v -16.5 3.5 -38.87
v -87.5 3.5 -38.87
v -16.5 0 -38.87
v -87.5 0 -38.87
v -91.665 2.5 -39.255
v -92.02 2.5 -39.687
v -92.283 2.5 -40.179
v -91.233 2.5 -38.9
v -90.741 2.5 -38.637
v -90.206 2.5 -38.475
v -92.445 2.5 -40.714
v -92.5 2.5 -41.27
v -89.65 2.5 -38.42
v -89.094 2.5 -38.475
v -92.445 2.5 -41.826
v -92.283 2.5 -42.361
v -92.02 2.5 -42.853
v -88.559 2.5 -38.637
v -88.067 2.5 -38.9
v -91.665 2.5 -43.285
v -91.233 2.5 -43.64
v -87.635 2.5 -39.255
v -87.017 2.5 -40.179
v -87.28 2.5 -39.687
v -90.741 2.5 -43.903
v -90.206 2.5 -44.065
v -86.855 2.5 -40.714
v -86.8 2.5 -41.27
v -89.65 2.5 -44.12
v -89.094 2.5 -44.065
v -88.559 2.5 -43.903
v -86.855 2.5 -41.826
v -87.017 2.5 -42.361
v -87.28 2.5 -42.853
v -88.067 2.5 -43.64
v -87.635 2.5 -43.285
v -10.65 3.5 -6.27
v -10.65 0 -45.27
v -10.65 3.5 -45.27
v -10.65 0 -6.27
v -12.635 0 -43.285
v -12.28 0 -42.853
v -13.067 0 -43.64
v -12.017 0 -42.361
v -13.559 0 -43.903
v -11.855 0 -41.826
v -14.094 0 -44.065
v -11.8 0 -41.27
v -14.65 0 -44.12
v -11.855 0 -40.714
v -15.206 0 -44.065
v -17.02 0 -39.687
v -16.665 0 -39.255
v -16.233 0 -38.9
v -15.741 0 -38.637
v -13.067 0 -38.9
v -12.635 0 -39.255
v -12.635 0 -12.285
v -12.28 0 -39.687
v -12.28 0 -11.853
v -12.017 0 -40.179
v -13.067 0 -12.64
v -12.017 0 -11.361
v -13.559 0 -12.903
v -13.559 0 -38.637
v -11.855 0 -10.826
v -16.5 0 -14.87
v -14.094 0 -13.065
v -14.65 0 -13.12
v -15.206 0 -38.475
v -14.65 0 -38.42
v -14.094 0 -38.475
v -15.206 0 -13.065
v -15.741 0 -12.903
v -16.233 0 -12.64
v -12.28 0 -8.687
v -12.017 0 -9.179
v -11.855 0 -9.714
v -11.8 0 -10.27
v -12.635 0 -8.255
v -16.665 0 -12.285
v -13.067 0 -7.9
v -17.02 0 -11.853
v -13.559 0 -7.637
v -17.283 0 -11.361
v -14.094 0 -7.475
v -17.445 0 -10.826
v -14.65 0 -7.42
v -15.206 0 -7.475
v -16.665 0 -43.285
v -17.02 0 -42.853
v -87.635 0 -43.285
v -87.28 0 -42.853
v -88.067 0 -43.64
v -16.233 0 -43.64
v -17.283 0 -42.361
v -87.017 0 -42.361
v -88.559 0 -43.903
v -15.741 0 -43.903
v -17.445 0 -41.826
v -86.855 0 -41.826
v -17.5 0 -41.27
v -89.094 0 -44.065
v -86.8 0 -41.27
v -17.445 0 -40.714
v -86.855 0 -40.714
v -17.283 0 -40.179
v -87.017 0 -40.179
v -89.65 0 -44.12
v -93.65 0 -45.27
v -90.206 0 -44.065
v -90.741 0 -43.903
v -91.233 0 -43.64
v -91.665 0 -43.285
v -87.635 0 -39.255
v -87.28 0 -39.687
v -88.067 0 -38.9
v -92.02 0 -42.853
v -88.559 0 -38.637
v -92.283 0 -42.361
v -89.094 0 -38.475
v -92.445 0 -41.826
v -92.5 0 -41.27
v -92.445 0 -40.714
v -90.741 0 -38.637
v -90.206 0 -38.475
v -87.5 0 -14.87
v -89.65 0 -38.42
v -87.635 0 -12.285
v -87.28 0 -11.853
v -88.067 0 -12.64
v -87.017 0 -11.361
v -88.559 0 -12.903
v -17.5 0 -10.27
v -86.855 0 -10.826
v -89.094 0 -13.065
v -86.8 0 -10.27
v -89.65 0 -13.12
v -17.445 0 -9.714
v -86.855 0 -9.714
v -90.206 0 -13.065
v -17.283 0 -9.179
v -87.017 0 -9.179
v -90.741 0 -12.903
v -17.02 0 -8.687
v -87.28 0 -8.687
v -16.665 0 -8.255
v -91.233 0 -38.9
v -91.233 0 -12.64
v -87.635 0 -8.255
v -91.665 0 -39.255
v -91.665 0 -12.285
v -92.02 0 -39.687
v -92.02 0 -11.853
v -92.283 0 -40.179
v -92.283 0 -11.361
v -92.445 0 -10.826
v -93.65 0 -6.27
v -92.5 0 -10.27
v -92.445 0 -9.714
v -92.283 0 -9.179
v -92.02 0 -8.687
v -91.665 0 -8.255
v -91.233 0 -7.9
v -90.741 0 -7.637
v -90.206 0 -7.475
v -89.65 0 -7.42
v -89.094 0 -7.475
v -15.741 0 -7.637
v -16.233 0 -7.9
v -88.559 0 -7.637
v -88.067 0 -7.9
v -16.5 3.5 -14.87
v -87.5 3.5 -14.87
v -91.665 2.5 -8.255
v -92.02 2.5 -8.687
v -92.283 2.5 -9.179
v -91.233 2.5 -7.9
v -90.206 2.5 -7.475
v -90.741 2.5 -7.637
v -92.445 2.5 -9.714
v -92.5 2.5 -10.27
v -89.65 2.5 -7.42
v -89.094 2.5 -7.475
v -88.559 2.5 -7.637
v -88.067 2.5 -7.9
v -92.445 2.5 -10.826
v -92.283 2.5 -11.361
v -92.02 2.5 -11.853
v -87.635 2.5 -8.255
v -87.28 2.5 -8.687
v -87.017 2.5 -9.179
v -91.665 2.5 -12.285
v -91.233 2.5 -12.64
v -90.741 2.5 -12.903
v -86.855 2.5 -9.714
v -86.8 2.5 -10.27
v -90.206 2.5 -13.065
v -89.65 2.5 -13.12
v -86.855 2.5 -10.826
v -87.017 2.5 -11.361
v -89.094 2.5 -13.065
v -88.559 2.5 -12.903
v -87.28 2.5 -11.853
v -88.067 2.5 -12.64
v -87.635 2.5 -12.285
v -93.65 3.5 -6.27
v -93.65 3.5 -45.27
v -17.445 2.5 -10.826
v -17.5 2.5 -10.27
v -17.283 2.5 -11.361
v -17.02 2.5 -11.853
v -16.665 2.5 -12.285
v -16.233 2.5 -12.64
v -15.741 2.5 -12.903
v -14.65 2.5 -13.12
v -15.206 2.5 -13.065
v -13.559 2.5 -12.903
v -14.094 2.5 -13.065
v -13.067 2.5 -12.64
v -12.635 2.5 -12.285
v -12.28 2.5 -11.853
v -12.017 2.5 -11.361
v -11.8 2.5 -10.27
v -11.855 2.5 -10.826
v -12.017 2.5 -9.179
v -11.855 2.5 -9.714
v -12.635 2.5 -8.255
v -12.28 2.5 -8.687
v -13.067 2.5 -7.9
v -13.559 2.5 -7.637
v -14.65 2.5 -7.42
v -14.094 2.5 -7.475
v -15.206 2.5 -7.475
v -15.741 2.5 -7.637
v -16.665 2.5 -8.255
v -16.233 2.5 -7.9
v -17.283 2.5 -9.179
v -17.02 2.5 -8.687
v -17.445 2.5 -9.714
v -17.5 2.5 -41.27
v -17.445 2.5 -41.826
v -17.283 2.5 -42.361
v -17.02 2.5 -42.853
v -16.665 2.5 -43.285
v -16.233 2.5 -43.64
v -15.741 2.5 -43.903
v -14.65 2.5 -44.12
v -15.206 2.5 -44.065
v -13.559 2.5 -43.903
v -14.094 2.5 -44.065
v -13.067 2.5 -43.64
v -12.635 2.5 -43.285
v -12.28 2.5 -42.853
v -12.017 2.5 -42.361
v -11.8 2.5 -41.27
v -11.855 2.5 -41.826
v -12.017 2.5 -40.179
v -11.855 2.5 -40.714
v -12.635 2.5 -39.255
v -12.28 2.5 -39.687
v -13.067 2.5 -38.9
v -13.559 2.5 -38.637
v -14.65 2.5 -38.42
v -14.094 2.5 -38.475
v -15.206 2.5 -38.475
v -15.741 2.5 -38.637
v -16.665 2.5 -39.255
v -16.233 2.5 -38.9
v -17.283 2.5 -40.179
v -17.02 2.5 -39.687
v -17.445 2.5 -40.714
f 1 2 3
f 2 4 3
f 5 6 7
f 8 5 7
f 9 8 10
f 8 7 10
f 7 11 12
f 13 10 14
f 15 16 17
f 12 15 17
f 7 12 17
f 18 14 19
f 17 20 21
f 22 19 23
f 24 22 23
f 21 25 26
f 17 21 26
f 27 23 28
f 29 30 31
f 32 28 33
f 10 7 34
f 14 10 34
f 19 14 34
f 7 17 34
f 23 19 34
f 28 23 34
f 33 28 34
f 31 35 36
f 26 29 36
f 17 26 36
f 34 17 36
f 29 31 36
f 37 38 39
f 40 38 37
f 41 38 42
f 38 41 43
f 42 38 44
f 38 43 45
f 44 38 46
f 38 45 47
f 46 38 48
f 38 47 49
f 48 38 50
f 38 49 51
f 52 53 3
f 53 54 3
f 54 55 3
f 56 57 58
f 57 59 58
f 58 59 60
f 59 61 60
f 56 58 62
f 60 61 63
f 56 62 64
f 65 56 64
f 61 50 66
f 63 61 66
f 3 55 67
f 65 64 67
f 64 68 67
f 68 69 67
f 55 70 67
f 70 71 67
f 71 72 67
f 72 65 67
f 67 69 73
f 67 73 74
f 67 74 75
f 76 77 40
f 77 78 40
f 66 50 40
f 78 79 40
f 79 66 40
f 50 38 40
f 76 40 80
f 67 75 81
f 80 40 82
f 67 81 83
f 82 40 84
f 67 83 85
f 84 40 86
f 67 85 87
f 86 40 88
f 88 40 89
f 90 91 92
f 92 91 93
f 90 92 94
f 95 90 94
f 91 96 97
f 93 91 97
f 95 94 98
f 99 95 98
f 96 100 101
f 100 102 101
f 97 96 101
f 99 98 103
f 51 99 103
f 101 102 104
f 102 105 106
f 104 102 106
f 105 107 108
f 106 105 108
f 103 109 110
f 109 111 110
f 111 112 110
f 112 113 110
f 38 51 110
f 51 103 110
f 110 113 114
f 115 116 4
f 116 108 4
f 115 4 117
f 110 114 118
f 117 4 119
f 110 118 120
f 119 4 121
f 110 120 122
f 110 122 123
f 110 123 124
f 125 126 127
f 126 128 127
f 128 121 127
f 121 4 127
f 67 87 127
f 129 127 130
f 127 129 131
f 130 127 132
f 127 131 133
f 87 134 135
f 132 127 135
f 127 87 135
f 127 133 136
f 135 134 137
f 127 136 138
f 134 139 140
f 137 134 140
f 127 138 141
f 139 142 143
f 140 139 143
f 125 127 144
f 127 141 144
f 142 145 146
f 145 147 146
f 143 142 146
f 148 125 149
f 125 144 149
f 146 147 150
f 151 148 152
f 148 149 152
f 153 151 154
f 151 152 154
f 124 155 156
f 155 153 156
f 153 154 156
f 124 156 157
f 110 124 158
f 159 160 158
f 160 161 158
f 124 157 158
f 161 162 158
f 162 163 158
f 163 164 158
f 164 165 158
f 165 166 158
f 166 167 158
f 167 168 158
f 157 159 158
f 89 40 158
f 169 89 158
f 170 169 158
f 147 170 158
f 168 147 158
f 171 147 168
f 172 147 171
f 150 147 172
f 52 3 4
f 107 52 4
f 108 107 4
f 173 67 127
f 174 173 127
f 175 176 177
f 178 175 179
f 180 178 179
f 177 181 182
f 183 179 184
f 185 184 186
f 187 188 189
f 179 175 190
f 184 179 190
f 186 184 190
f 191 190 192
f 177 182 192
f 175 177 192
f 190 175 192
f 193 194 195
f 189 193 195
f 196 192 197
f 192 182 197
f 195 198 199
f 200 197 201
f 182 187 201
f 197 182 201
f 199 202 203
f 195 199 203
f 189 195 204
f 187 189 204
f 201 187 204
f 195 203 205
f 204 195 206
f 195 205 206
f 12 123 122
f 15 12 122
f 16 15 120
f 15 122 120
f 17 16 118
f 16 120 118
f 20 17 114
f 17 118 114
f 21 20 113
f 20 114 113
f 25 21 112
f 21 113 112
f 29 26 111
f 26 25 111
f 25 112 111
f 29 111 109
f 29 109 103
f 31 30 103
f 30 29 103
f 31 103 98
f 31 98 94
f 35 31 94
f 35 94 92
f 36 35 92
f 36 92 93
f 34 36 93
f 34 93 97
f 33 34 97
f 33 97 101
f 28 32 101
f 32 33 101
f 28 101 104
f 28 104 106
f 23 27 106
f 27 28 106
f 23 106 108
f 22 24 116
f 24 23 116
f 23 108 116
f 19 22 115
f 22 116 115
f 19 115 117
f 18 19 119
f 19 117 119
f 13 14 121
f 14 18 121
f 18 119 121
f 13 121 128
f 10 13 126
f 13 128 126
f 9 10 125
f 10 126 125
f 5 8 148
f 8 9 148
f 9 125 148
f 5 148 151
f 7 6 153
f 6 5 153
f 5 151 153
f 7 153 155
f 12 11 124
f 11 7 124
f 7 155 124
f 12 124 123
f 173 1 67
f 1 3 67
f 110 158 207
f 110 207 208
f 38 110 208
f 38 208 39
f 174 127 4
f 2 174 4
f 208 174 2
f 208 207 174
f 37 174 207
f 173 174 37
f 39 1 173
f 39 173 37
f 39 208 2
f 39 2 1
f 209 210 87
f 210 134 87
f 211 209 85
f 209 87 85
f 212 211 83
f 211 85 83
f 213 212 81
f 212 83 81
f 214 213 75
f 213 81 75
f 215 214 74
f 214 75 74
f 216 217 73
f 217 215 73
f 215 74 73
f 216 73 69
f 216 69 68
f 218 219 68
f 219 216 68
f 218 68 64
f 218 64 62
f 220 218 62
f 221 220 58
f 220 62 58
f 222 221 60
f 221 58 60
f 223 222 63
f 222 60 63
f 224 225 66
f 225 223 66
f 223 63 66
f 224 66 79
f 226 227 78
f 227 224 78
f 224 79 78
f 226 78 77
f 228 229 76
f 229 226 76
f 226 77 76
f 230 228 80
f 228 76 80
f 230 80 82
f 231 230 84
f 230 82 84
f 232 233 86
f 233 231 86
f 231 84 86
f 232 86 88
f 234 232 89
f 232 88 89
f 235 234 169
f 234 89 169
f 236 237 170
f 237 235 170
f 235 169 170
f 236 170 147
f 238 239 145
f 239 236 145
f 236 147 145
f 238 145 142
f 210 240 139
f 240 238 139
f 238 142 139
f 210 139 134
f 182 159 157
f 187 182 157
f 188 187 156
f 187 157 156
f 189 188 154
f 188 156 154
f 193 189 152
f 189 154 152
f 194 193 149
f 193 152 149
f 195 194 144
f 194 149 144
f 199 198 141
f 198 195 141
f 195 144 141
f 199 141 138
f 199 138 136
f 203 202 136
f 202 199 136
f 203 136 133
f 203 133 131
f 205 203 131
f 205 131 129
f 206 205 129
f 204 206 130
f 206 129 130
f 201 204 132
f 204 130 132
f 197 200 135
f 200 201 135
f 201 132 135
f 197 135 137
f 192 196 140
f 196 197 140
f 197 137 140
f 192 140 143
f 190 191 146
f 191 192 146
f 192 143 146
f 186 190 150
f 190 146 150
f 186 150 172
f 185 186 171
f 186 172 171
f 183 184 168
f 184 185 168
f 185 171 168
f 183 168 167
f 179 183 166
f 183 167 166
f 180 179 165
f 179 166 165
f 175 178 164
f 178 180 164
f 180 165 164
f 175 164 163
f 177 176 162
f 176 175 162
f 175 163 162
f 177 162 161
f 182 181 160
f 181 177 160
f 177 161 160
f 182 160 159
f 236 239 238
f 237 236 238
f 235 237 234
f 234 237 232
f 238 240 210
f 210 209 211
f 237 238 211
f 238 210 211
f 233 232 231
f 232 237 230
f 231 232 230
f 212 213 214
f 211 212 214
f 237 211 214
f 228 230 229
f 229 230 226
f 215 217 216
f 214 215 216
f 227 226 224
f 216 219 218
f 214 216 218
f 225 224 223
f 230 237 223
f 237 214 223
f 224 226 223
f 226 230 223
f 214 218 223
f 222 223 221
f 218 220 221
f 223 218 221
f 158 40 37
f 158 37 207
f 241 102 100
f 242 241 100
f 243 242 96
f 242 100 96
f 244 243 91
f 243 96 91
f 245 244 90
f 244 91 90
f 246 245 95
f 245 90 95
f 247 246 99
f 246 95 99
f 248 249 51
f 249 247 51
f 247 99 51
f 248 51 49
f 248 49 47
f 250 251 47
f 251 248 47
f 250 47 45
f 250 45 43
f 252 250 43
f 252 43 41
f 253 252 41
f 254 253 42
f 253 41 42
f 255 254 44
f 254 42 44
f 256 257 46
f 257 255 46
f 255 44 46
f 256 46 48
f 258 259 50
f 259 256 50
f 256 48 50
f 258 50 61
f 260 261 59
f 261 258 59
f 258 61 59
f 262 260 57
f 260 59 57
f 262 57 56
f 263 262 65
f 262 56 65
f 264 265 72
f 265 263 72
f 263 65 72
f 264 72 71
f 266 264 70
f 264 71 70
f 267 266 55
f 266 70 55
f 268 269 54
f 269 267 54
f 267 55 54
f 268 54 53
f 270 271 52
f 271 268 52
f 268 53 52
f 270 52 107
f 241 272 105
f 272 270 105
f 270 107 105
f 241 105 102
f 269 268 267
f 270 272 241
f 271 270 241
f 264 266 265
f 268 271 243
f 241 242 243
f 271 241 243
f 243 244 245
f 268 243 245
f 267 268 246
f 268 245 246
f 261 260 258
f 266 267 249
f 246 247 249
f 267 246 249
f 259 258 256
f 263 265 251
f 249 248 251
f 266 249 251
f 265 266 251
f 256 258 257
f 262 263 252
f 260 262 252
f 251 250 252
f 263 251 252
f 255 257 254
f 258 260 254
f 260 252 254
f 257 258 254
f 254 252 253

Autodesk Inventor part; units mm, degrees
ref_plane "YZ Plane" through (0, 0, 0) normal (1, 0, 0) x (0, 1, 0)
ref_plane "XZ Plane" through (0, 0, 0) normal (0, 1, 0) x (-1, 0, 0)
ref_plane "XY Plane" through (0, 0, 0) normal (0, 0, 1) x (1, 0, 0)
sketch "Esboço1" plane through (0, 0, 0) normal (0, 1, 0) x (-1, 0, 0)
  circle A0 centre (89.65, -41.2701) radius 1.5
  circle A1 centre (89.65, -10.2701) radius 1.5
  circle A2 centre (14.65, -10.2701) radius 1.5
  circle A3 centre (14.65, -41.2701) radius 1.5
  line L0 (14.65, -10.2701) -> (10.65, -10.2701) construction
  line L1 (10.65, -10.2701) -> (10.65, -6.2701) construction
  line L2 (10.65, -6.2701) -> (93.65, -6.2701)
  line L3 (93.65, -6.2701) -> (93.65, -45.2701)
  line L4 (93.65, -45.2701) -> (10.65, -45.2701)
  line L5 (10.65, -45.2701) -> (10.65, -6.2701)
  line L6 (87.5, -38.8701) -> (87.5, -14.8701) construction
  line L7 (87.5, -14.8701) -> (16.5, -14.8701) construction
  line L8 (16.5, -14.8701) -> (16.5, -38.8701) construction
  line L9 (16.5, -38.8701) -> (87.5, -38.8701) construction
  line L10 (87.5, -14.8701) -> (88.5, -14.8701) construction
  line L11 (88.5, -14.8701) -> (88.5, -13.8701) construction
  line L12 (88.5, -13.8701) -> (87.5, -13.8701) construction
  line L13 (87.5, -13.8701) -> (87.5, -14.8701) construction
  circle A4 centre (14.65, -10.2701) radius 2.85
  circle A5 centre (14.65, -41.2701) radius 2.85
  circle A6 centre (89.65, -41.2701) radius 2.85
  circle A7 centre (89.65, -10.2701) radius 2.85
  line L14 (16.5, -14.8701) -> (87.5, -14.8701)
  line L15 (87.5, -14.8701) -> (87.5, -38.8701)
  line L16 (87.5, -38.8701) -> (16.5, -38.8701)
  line L17 (16.5, -38.8701) -> (16.5, -14.8701)
  point P0 (0, 0)
  dimension "d0" = 4
  dimension "d1" = 4
  dimension "d2" = 4
  dimension "d3" = 4
  dimension "d4" = 4
  dimension "d5" = 4
  dimension "d6" = 4
  dimension "d7" = 4
  dimension "d8" = 1
  dimension "d9" = 1
  dimension "d10" = 5.7
  dimension "d11" = 5.7
  dimension "d12" = 5.7
  dimension "d13" = 5.7
extrude "Extrusão1" add sketch "Esboço1" along normal blind 2.5 contours L2 L3 L4 L5
sketch "Esboço2" plane through (0, 2.5, 0) normal (0, 1, 0) x (1, 0, 0)
  line L0 (-93.65, 6.2701) -> (-10.65, 6.2701) projected
  line L1 (-93.65, 45.2701) -> (-93.65, 6.2701) projected
  line L2 (-10.65, 6.2701) -> (-93.65, 6.2701)
  line L3 (-93.65, 6.2701) -> (-93.65, 45.2701)
  line L4 (-93.65, 45.2701) -> (-10.65, 45.2701)
  line L5 (-10.65, 45.2701) -> (-10.65, 6.2701)
  line L6 (-87.5, 14.8701) -> (-87.5, 38.8701) projected
  line L7 (-16.5, 14.8701) -> (-87.5, 14.8701) projected
  line L8 (-87.5, 38.8701) -> (-16.5, 38.8701)
  line L9 (-16.5, 38.8701) -> (-16.5, 14.8701)
  line L10 (-16.5, 14.8701) -> (-87.5, 14.8701)
  line L11 (-87.5, 14.8701) -> (-87.5, 38.8701)
  point P0 (0, 0)
extrude "Extrusão2" add sketch "Esboço2" along normal blind 1
properties part number "painel lcd"
